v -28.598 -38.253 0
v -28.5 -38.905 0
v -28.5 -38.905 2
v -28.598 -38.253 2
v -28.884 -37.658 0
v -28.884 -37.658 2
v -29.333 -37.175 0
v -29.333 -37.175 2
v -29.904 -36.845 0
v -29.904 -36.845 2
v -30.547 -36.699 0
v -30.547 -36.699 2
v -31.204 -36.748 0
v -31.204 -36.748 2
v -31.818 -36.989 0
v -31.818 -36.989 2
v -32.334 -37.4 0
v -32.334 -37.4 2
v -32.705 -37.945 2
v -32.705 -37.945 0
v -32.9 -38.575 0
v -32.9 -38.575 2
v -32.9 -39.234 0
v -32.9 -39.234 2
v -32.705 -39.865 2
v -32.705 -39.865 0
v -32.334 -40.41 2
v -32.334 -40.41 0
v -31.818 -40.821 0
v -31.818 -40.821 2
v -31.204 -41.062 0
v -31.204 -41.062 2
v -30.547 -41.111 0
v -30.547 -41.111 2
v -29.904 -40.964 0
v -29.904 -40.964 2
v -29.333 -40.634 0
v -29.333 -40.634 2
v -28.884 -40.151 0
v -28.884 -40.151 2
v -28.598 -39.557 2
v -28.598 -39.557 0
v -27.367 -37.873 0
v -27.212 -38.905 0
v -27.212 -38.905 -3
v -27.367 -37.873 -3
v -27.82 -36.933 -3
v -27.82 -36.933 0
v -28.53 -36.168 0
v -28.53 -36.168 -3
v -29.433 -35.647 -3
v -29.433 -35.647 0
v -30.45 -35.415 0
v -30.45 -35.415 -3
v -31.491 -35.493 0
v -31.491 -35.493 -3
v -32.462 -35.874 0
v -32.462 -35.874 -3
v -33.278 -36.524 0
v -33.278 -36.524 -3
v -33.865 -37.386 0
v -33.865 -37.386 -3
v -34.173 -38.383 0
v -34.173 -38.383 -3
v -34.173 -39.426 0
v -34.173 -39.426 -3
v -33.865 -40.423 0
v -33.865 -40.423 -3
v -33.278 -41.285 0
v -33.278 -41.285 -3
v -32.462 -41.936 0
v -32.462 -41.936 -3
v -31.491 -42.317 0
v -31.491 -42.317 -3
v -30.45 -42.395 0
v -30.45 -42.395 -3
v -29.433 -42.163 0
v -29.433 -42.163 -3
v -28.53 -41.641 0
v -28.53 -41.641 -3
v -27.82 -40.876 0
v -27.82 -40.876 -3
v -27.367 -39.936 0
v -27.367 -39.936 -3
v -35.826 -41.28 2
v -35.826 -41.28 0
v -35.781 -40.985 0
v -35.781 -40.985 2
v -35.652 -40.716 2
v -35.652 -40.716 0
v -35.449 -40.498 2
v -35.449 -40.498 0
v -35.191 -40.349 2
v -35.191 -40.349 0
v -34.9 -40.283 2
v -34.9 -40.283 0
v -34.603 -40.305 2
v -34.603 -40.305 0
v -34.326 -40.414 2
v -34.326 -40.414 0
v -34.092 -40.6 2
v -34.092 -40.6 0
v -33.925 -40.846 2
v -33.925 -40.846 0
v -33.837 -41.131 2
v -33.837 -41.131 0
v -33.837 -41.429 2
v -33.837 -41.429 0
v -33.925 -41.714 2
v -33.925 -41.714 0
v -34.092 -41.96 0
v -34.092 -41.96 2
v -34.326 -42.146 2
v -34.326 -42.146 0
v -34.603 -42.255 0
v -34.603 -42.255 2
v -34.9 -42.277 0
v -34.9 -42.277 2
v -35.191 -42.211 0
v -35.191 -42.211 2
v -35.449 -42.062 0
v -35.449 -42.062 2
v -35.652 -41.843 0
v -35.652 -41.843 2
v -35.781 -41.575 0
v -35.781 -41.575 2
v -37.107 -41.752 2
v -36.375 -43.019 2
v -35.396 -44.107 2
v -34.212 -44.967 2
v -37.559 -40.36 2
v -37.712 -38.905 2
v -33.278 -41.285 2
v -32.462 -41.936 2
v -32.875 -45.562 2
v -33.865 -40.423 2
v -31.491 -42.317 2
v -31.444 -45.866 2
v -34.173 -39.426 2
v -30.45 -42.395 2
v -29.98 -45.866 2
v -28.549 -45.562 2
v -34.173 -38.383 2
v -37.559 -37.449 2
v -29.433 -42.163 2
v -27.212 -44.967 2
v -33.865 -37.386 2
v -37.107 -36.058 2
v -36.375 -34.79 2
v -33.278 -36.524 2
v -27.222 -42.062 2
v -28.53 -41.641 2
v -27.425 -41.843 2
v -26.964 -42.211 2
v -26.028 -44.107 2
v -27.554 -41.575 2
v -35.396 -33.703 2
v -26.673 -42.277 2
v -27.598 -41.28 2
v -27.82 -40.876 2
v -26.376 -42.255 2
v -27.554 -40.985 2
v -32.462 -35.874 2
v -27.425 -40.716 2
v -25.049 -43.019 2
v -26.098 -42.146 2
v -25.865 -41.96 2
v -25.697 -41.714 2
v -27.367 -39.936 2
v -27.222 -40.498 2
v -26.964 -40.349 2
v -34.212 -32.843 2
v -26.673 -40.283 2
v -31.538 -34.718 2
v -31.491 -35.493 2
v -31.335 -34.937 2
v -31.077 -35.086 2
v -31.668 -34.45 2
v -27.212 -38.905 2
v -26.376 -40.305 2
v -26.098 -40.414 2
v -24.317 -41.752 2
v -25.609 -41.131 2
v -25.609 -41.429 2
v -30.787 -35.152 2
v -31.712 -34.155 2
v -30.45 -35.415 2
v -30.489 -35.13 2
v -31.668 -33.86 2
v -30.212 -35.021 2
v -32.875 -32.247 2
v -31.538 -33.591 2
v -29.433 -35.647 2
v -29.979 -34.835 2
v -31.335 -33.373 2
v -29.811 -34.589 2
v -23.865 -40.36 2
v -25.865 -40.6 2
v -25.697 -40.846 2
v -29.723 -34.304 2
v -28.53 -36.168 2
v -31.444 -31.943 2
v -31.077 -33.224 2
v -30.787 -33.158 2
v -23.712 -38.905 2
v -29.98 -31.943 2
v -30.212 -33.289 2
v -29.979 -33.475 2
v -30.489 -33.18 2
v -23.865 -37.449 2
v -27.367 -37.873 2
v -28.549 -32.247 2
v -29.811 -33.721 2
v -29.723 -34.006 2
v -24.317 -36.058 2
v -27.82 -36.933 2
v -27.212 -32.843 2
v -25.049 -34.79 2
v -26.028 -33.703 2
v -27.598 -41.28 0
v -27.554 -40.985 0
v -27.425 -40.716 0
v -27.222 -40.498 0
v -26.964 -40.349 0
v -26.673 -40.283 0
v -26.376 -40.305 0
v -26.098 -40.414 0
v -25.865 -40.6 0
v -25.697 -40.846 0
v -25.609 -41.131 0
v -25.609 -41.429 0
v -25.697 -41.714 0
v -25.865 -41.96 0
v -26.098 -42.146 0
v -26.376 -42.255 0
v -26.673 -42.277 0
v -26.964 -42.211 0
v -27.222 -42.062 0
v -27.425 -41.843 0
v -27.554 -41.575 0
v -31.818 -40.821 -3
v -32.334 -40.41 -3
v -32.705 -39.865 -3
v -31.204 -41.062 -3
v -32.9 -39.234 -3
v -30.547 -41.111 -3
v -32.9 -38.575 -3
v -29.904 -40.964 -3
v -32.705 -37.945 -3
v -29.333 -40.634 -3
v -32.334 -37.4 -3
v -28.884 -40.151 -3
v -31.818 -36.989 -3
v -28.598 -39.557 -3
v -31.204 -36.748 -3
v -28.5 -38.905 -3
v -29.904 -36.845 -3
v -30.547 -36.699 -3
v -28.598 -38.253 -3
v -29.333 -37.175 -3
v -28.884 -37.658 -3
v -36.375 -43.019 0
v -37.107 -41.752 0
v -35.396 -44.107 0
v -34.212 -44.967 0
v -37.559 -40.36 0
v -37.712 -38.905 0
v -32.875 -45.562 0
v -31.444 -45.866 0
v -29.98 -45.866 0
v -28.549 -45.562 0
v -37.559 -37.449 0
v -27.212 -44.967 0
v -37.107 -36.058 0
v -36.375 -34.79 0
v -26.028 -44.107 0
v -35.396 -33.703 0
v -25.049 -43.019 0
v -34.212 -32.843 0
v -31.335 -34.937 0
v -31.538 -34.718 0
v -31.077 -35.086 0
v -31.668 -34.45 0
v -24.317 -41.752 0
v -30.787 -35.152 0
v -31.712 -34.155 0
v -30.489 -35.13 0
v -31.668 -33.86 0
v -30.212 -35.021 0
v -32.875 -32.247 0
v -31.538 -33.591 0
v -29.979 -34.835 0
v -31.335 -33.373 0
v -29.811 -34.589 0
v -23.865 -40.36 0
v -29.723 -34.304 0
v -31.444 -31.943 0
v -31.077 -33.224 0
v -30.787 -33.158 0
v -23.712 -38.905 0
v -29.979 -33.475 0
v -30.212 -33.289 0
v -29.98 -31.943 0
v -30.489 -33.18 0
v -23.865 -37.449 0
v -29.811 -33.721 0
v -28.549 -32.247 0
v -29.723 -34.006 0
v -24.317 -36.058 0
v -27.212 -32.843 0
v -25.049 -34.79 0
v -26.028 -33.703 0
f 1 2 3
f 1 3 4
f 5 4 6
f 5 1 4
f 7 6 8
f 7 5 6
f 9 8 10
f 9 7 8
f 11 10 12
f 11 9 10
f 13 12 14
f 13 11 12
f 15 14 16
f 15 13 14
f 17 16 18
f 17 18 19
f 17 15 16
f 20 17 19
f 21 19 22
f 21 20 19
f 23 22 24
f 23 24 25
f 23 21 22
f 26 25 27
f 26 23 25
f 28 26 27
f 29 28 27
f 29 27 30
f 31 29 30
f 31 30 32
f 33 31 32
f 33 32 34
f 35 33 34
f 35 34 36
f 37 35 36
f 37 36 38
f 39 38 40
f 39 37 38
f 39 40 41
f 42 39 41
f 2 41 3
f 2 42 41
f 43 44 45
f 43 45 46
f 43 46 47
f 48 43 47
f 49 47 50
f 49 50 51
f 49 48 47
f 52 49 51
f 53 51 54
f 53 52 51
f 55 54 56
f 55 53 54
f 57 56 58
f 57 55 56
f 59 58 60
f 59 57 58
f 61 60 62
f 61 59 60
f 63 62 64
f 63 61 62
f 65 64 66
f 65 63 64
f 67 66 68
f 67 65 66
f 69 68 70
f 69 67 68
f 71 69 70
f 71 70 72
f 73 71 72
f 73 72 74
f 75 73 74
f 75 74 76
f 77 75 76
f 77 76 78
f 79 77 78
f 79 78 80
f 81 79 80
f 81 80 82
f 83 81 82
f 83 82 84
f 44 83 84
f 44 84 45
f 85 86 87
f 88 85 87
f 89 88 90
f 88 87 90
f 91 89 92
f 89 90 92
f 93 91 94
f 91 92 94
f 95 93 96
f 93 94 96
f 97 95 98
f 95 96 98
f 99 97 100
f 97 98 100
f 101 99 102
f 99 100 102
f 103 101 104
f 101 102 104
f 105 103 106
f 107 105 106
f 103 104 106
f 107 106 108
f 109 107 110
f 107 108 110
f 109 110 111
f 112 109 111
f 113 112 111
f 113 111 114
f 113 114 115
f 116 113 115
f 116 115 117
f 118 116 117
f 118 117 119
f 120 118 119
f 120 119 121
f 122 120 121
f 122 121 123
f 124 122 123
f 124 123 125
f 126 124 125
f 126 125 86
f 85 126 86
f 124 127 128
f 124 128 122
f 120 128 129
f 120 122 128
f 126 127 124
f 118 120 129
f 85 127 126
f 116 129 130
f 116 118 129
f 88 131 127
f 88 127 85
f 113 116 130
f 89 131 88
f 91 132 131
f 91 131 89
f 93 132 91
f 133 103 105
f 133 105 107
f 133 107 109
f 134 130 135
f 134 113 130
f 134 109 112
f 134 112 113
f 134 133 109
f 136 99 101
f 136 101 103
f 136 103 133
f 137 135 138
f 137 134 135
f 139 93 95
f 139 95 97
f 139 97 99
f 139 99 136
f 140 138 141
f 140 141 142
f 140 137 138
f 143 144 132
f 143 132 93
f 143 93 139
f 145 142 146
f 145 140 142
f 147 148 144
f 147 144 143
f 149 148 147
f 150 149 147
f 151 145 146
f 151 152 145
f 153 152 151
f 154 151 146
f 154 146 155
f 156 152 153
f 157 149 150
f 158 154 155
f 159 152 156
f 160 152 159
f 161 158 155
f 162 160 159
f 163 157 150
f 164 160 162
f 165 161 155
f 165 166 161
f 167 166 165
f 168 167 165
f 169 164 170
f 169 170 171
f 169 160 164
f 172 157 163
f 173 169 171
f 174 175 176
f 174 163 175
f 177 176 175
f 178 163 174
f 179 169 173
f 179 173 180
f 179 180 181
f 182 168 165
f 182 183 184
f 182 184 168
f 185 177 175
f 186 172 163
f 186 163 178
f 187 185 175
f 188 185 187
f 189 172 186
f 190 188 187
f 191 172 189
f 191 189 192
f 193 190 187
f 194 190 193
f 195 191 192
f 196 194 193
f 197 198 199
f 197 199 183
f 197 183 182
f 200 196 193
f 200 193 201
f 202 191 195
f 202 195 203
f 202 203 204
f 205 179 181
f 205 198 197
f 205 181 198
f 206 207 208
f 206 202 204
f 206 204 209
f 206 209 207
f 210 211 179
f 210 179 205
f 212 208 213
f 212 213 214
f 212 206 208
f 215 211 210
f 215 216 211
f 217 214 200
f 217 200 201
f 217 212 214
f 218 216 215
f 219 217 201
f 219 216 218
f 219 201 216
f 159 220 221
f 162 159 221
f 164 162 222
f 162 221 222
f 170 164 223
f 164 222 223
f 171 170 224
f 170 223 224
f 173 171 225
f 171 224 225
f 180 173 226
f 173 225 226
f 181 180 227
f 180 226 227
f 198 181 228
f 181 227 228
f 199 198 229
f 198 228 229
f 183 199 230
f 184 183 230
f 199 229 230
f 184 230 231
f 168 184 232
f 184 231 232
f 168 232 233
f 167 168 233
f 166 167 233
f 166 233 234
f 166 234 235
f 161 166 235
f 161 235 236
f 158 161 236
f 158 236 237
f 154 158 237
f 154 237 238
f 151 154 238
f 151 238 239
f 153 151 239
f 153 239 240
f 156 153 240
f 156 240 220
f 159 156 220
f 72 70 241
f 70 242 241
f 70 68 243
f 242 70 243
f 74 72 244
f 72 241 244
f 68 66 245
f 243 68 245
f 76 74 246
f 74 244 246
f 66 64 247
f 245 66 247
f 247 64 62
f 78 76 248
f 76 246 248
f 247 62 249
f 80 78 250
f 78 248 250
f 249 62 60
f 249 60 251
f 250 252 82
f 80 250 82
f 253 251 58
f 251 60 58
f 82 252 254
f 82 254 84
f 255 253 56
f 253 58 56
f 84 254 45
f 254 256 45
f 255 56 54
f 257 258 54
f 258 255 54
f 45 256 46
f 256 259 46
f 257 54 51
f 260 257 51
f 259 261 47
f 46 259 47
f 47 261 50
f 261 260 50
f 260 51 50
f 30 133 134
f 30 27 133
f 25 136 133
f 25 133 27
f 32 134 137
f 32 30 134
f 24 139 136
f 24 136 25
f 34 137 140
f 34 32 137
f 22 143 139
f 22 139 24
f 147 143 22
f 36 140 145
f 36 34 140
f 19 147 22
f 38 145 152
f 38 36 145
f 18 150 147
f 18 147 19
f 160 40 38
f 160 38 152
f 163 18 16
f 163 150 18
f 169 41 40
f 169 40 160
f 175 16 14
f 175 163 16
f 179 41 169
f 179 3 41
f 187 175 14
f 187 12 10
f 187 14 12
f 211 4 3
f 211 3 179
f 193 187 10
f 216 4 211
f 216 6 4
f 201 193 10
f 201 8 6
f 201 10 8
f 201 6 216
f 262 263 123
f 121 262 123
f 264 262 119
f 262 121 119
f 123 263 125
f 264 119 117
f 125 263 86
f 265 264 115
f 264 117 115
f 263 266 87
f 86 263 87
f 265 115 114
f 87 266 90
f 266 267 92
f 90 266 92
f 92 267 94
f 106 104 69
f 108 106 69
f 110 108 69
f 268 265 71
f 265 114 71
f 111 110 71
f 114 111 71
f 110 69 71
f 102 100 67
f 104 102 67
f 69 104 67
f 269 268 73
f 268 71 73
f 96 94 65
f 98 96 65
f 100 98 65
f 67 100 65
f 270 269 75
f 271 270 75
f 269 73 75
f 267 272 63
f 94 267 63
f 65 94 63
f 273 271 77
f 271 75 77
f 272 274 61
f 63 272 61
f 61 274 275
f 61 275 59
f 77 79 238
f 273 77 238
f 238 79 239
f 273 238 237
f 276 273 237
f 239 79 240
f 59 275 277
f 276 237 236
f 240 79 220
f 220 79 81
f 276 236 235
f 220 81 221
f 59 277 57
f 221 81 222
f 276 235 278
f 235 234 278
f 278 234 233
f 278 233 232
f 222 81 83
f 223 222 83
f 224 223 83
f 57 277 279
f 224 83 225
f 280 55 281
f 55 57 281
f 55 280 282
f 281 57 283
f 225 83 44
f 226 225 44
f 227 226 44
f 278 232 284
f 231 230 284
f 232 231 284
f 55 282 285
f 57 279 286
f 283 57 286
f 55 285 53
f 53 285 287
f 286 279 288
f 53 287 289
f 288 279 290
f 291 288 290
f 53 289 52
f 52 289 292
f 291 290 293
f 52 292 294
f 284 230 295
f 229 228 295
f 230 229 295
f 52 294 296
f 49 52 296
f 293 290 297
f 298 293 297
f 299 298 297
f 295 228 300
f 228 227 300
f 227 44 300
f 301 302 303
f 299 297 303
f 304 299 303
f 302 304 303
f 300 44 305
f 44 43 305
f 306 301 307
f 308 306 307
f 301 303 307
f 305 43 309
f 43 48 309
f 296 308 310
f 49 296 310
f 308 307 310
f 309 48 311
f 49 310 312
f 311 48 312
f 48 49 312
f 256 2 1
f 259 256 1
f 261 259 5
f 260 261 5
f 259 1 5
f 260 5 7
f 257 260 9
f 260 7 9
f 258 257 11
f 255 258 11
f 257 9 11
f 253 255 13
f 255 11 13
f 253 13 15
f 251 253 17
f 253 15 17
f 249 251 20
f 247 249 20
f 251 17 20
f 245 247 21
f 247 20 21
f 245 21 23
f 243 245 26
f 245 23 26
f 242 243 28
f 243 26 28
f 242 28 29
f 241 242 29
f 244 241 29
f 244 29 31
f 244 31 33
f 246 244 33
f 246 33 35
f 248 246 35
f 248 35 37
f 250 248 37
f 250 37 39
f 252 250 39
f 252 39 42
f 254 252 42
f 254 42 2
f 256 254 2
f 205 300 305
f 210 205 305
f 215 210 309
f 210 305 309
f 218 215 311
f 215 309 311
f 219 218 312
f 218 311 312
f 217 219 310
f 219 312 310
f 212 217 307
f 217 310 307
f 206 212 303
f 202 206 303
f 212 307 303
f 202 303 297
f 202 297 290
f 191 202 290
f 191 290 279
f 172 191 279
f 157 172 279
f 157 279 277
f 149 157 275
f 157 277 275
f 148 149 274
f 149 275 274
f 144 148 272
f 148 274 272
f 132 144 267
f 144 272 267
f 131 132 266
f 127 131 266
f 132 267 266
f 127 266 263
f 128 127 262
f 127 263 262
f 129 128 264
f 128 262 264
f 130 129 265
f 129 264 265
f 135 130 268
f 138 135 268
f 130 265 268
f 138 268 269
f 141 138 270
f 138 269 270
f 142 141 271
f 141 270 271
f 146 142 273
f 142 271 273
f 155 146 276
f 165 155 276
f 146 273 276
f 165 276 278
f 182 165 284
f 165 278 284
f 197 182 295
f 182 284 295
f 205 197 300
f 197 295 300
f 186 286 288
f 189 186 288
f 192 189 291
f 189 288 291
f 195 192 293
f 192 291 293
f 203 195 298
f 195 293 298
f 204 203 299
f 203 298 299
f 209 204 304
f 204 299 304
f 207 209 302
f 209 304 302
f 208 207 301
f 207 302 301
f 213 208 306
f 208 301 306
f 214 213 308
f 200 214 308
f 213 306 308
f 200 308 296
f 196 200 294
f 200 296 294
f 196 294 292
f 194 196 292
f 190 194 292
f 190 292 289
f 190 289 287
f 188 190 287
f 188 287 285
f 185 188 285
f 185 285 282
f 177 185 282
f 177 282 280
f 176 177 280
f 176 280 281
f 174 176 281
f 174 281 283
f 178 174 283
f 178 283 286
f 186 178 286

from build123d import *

# Parameters (mm, degrees)
IZIM1_R                     = 7
IZIM1_R_2                   = 2.212355073
Y_KSEKLIK_EKSTR_ZYON1_DEPTH = 2
IZIM2_R                     = 3.5
IZIM2_R_2                   = 2.212355073
Y_KSEKLIK_EKSTR_ZYON2_DEPTH = 5
IZIM3_R                     = 1
KES_EKSTR_ZYON1_DEPTH       = 5


with BuildPart() as part:
    # Çizim1 → Yükseklik-Ekstrüzyon1 (new body)
    with BuildSketch(Plane.XY):
        with Locations((-30.711927379, -38.904760786)):
            Circle(IZIM1_R)
        with Locations((-30.711927379, -38.904760786)):
            Circle(IZIM1_R_2, mode=Mode.SUBTRACT)
    extrude(amount=Y_KSEKLIK_EKSTR_ZYON1_DEPTH)

    # Çizim2 → Yükseklik-Ekstrüzyon2 (add)
    with BuildSketch(Plane.XY.offset(2)):
        with Locations((-30.711927379, -38.904760786)):
            Circle(IZIM2_R)
        with Locations((-30.711927379, -38.904760786)):
            Circle(IZIM2_R_2, mode=Mode.SUBTRACT)
    extrude(amount=-Y_KSEKLIK_EKSTR_ZYON2_DEPTH)

    # Çizim3 → Kes-Ekstrüzyon1 (cut)
    with BuildSketch(Plane(origin=(0, 0, 0), x_dir=(-1, 0, 0), z_dir=(0, 0, -1))):
        with Locations((30.711927379, -34.154760786)):
            Circle(IZIM3_R)
        with Locations((34.825548047, -41.279760786)):
            Circle(IZIM3_R)
        with Locations((26.598306711, -41.279760786)):
            Circle(IZIM3_R)
    extrude(amount=-KES_EKSTR_ZYON1_DEPTH, mode=Mode.SUBTRACT)


solid = part.part
